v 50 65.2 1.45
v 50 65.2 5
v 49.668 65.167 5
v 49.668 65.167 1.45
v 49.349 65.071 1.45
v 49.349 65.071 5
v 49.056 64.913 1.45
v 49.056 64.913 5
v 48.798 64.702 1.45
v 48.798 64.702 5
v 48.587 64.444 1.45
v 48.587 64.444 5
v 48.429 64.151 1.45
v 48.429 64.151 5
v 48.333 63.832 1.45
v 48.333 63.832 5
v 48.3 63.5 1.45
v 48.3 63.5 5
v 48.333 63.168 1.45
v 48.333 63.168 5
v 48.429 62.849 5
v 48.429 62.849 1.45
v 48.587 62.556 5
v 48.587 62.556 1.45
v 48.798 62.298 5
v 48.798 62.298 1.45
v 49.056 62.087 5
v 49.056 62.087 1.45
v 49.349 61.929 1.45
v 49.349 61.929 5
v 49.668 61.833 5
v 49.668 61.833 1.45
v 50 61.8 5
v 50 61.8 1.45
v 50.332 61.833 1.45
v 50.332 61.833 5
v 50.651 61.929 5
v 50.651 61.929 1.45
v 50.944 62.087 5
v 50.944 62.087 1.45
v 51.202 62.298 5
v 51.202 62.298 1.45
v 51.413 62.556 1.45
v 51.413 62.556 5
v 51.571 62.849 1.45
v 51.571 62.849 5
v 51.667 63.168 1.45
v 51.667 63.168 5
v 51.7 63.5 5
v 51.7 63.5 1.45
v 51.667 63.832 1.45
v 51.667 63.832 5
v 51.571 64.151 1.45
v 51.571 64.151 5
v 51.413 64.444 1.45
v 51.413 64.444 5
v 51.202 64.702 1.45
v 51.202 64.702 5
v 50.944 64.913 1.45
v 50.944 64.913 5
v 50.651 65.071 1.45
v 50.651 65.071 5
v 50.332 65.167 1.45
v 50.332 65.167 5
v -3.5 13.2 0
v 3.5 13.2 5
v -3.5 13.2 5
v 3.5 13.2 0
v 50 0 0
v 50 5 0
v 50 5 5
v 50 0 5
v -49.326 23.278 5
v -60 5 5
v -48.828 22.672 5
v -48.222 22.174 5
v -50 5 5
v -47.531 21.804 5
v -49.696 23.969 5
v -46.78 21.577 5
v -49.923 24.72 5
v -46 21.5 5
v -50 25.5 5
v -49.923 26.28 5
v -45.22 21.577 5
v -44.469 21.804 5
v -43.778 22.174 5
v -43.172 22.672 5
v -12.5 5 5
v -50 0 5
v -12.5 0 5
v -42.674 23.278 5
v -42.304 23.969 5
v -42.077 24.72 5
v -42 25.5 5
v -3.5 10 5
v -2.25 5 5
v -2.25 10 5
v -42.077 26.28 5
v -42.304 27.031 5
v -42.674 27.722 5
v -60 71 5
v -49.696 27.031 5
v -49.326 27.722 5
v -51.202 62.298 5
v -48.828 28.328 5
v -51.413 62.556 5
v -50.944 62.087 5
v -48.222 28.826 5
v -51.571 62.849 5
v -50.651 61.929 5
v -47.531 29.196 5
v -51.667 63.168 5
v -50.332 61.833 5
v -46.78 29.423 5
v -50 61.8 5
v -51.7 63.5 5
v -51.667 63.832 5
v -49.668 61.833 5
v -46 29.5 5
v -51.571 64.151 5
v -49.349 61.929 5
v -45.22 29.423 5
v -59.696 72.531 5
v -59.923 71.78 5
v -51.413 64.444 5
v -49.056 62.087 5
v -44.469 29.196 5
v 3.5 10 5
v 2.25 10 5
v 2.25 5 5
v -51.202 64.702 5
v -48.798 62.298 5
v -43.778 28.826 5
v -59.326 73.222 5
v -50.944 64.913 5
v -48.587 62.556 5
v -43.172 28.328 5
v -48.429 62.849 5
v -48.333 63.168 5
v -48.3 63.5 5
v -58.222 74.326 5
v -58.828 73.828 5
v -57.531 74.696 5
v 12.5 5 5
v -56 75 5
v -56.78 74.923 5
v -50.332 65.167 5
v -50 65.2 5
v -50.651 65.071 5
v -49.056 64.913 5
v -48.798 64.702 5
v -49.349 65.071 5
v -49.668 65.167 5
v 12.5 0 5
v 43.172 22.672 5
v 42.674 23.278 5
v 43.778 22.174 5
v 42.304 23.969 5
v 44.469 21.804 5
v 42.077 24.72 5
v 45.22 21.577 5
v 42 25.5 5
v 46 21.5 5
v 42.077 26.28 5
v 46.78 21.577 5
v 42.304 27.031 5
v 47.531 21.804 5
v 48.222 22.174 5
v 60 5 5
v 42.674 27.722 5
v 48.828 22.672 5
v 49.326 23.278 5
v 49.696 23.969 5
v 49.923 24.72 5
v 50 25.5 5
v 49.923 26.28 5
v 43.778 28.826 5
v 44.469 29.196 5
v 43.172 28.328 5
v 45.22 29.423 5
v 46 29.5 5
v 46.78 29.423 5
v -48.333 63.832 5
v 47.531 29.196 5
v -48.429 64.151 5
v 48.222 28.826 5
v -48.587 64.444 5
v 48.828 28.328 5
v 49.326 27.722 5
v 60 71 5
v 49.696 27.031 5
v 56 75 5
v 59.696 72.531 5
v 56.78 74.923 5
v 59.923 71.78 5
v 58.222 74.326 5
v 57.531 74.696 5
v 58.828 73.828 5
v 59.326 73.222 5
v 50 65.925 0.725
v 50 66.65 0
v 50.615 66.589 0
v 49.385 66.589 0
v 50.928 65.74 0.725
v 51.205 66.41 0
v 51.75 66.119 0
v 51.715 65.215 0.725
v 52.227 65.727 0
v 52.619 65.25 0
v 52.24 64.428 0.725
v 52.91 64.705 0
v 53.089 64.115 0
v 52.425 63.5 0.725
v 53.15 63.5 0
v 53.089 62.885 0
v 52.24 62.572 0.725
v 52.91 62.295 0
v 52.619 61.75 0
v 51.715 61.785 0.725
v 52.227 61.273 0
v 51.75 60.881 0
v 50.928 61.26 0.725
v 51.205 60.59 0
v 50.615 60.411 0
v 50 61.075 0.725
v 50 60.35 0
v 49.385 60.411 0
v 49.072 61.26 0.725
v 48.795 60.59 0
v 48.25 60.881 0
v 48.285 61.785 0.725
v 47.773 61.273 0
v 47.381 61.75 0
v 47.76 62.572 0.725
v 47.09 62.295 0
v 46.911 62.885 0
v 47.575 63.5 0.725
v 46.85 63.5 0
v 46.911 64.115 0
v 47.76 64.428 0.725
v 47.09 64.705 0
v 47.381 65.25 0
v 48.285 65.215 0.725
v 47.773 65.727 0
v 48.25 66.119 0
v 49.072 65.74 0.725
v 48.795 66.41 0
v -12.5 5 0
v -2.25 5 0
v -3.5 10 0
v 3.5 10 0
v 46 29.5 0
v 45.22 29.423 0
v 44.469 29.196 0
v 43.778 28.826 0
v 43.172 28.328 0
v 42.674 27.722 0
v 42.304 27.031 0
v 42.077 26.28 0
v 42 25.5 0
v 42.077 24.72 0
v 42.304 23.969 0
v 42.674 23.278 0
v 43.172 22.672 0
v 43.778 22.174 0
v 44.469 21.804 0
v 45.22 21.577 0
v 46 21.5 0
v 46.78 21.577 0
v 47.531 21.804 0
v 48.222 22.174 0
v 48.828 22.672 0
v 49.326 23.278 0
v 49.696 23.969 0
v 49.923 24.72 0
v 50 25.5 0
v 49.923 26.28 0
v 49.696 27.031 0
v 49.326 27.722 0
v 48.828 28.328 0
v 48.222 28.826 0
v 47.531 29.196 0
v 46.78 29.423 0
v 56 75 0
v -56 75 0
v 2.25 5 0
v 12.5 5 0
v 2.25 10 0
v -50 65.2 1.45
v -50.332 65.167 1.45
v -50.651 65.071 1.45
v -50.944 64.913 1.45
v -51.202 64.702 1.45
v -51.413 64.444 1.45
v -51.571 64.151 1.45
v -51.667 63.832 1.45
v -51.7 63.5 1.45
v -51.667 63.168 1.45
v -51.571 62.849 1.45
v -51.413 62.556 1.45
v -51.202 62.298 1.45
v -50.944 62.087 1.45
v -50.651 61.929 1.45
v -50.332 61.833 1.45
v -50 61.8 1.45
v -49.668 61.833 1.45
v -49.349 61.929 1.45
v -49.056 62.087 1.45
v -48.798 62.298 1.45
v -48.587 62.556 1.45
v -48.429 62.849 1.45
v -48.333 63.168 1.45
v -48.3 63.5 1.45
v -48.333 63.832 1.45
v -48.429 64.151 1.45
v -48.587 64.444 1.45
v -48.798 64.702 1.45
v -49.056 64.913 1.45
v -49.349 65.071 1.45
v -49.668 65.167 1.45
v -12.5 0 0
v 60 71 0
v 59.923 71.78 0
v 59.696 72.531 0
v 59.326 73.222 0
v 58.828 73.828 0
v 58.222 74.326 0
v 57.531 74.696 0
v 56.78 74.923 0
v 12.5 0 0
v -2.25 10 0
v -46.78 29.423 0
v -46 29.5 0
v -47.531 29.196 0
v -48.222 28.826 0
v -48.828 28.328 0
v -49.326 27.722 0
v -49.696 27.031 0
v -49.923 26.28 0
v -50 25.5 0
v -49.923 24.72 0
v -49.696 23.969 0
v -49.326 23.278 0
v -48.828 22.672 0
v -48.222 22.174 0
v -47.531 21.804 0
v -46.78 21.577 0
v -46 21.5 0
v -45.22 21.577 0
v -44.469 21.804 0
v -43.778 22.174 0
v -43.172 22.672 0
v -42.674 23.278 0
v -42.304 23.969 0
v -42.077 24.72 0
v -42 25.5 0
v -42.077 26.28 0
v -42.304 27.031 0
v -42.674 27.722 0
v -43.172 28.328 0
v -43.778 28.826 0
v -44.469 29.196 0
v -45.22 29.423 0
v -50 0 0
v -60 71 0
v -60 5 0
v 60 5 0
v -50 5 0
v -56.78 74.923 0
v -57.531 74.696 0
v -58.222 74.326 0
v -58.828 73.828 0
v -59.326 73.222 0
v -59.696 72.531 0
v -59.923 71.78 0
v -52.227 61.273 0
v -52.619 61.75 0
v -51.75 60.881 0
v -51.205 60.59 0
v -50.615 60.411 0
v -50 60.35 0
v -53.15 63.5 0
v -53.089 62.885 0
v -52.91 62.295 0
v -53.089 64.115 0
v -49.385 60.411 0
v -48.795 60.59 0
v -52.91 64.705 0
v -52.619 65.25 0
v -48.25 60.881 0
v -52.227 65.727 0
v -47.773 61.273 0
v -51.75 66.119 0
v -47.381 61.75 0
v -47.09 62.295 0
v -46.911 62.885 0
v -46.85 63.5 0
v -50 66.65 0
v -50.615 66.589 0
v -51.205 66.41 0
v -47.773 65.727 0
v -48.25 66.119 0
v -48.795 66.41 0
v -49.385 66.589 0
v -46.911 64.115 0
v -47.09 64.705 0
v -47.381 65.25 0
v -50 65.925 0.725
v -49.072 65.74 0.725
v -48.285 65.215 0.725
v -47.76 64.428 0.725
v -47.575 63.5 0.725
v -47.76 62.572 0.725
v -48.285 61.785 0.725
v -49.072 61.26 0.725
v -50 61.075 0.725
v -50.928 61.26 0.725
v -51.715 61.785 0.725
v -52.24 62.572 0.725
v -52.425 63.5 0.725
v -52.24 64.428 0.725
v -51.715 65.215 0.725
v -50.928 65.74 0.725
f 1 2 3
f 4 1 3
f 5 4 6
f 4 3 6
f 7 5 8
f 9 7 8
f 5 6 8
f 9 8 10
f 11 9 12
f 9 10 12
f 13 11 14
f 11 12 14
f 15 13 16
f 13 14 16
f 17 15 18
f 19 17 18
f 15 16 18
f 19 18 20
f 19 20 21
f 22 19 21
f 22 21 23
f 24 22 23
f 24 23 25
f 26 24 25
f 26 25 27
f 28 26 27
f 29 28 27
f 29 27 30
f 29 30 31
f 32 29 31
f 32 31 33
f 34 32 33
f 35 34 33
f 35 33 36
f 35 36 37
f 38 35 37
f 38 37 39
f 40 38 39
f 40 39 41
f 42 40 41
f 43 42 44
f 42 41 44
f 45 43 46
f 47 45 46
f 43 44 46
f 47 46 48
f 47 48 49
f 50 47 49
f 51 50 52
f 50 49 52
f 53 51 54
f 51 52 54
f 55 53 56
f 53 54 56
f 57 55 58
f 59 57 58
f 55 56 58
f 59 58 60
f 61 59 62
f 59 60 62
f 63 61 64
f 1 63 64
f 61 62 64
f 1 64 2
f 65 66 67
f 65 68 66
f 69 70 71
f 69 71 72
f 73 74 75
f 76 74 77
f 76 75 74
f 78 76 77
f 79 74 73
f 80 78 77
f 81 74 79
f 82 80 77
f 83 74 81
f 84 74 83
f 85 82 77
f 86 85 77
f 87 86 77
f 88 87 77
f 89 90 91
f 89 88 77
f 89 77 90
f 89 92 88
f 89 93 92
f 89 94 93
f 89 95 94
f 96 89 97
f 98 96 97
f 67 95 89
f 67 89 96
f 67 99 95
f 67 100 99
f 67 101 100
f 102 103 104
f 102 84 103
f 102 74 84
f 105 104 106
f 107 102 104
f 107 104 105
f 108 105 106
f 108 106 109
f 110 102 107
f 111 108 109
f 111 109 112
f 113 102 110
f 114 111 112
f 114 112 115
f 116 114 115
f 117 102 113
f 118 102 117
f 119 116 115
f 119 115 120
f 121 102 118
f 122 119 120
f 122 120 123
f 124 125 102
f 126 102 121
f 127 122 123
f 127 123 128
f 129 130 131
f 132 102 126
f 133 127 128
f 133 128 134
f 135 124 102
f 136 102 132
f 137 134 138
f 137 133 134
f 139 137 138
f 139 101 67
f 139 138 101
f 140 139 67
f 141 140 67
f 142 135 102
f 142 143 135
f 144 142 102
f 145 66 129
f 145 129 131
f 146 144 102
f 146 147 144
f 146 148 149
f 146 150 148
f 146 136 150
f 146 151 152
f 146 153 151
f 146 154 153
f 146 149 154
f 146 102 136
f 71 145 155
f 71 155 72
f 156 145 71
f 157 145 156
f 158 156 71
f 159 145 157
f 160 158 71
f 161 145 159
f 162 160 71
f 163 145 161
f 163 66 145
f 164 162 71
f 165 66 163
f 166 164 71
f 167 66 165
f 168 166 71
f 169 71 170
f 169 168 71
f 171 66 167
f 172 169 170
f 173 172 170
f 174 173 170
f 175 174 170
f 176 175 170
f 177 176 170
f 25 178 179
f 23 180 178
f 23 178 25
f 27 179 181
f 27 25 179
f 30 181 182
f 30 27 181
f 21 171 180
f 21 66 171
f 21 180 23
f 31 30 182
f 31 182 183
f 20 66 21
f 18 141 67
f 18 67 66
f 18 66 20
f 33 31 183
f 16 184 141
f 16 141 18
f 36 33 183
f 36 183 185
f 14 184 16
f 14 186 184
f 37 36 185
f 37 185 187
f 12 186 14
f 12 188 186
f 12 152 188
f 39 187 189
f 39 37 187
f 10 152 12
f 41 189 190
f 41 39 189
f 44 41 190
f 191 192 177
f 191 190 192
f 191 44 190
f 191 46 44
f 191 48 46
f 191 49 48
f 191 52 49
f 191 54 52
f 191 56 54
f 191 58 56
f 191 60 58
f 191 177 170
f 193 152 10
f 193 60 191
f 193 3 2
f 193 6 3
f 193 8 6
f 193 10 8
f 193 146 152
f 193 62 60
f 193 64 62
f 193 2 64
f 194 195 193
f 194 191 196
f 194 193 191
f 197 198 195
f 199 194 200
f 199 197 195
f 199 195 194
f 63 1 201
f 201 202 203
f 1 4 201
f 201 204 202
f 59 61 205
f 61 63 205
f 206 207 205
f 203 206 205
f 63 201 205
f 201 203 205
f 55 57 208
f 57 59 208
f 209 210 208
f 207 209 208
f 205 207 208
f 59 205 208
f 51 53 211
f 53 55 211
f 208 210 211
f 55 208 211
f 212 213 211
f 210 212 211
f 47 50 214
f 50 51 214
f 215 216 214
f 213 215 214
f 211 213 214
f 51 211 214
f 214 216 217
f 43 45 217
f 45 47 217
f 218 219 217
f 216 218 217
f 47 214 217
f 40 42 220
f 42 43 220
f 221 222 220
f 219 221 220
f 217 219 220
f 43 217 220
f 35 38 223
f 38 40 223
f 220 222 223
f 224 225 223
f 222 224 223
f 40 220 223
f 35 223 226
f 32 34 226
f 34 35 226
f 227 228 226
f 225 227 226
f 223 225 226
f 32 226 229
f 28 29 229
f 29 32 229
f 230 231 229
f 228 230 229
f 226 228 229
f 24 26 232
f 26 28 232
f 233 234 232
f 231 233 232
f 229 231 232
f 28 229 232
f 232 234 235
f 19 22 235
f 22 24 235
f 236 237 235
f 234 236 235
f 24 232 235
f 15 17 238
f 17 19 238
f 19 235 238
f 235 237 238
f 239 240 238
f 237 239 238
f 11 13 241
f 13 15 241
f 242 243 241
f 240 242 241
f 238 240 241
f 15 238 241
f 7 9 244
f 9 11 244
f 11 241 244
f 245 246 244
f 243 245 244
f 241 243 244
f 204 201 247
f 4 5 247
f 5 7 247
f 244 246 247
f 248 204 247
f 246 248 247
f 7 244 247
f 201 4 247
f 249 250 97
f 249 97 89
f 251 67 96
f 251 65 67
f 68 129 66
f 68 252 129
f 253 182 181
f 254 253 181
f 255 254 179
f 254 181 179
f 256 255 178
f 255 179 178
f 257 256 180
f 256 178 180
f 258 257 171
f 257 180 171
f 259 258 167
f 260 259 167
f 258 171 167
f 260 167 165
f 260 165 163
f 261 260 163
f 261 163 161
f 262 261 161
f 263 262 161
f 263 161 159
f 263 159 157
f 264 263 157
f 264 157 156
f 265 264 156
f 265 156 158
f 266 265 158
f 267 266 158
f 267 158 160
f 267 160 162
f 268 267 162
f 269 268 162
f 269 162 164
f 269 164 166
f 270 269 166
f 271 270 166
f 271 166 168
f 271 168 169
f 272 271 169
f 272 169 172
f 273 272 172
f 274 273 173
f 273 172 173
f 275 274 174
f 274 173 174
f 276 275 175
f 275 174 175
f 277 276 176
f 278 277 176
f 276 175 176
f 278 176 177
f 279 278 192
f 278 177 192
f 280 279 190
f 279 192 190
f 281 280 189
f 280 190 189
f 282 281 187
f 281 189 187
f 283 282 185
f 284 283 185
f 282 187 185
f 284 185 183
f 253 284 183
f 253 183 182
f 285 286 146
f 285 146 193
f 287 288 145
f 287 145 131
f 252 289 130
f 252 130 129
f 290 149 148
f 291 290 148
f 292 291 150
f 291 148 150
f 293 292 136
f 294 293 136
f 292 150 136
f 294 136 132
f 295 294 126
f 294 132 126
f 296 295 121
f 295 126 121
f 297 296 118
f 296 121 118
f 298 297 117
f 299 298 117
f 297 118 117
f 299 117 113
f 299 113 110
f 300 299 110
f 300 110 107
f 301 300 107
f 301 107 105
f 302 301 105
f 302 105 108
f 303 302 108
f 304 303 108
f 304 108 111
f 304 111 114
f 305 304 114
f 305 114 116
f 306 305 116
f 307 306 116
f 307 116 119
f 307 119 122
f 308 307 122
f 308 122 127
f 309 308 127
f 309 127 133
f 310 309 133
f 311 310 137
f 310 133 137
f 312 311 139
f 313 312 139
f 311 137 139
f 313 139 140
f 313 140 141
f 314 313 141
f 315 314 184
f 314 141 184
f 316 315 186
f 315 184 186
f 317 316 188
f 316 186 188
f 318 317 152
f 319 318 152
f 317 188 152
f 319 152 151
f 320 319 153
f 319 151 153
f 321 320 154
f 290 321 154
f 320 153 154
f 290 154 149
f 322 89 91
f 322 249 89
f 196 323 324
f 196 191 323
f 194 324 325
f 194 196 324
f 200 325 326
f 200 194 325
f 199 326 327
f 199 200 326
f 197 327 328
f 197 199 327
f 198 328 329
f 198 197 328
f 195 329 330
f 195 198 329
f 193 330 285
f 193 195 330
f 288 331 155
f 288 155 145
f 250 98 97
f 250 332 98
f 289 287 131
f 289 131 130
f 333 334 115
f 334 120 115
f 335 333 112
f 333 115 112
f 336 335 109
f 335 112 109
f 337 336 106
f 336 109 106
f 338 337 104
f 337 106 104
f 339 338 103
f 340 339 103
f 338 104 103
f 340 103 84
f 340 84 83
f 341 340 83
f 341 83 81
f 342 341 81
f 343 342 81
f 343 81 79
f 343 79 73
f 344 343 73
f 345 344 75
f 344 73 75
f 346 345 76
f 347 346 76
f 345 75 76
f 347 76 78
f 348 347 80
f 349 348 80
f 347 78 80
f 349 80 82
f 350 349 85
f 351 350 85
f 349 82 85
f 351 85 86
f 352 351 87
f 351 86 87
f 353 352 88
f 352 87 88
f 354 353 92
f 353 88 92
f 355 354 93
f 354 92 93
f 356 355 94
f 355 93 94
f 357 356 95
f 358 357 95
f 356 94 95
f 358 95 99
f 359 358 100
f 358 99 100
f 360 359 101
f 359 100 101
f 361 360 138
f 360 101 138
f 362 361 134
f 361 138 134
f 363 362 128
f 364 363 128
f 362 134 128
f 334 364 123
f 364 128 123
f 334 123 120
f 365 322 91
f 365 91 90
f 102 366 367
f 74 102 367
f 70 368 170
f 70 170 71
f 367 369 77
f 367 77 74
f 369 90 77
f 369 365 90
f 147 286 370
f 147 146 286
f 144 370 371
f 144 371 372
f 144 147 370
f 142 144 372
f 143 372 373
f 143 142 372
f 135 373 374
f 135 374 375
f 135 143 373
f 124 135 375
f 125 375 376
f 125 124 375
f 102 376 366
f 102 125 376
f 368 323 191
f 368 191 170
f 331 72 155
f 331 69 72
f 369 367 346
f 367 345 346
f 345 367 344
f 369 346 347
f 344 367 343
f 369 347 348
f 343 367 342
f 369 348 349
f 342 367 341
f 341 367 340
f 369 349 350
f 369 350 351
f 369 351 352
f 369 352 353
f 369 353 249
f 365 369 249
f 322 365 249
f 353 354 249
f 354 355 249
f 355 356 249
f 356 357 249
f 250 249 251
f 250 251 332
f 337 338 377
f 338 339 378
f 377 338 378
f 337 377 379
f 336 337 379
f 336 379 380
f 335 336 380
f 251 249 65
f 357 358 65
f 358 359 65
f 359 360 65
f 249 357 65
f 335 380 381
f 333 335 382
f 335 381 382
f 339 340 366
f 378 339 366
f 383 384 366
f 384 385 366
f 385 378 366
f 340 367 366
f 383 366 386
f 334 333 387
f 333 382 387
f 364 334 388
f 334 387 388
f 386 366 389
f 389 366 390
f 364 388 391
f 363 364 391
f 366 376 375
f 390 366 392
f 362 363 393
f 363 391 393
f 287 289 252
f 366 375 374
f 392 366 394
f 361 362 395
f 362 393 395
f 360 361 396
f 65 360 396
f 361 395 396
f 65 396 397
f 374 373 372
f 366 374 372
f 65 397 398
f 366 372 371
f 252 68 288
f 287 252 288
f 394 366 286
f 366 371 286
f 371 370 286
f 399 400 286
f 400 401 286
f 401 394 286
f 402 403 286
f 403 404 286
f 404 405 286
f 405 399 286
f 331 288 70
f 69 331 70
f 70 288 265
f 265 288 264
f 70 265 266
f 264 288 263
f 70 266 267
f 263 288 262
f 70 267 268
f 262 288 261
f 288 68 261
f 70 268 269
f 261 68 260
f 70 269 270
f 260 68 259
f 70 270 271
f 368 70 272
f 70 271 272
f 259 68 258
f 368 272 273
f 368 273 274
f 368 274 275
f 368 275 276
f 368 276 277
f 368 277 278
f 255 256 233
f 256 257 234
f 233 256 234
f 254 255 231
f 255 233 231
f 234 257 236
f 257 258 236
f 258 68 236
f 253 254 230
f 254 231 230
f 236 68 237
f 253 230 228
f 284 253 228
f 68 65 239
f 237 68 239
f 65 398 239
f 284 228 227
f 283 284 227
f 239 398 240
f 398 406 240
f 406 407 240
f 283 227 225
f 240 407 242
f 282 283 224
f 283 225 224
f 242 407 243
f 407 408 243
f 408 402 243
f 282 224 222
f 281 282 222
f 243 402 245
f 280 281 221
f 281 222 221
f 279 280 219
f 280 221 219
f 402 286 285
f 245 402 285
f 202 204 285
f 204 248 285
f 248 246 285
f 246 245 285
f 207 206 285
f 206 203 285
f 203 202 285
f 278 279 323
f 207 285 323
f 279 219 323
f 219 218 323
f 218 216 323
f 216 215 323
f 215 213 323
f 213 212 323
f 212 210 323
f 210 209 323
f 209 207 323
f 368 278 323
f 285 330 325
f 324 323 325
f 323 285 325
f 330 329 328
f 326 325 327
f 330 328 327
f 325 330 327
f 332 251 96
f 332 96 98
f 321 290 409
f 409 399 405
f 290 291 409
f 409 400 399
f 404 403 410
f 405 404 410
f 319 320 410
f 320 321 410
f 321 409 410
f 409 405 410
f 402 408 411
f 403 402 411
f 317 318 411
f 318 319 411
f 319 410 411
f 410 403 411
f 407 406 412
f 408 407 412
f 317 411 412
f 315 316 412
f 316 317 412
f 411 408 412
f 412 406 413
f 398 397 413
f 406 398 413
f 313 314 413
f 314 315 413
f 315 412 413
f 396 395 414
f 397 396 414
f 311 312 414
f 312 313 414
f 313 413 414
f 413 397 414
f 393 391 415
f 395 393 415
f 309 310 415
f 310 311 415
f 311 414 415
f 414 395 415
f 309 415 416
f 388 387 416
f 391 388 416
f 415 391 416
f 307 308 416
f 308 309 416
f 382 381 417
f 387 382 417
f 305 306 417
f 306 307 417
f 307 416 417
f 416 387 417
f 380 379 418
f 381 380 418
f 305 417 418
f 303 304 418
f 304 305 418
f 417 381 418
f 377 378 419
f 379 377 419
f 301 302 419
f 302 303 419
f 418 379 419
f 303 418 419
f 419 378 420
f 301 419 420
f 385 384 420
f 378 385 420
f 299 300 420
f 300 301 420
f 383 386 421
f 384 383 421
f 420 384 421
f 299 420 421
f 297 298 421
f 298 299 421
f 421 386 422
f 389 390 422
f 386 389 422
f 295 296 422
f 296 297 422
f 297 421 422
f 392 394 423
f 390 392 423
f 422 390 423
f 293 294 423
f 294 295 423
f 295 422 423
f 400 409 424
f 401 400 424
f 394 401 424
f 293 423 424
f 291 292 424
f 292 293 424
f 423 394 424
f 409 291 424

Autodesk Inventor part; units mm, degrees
ref_plane "YZ Plane" through (0, 0, 0) normal (1, 0, 0) x (0, 1, 0)
ref_plane "XZ Plane" through (0, 0, 0) normal (0, 1, 0) x (-1, 0, 0)
ref_plane "XY Plane" through (0, 0, 0) normal (0, 0, 1) x (1, 0, 0)
sketch "Sketch1" plane through (0, 0, 0) normal (0, 0, 1) x (1, 0, 0)
  line L0 (-60, 75) -> (60, 75)
  line L1 (60, 75) -> (60, 5)
  line L2 (60, 5) -> (50, 5)
  line L3 (50, 5) -> (50, 0)
  line L4 (-50, 0) -> (-50, 5)
  line L5 (-50, 5) -> (-60, 5)
  line L6 (-60, 75) -> (-60, 5)
  line L7 (50, 0) -> (12.5, 0)
  line L8 (12.5, 0) -> (12.5, 5)
  line L9 (12.5, 5) -> (-12.5, 5)
  line L10 (-12.5, 5) -> (-12.5, 0)
  line L11 (-12.5, 0) -> (-50, 0)
  point P0 (0, 0)
  point P1 (0, 75)
  point P2 (0, 0)
  point P3 (0, 5)
  dimension "d0" = 5
  dimension "d1" = 100
  dimension "d2" = 120
  dimension "d3" = 70
  dimension "d22" = 5
  dimension "d23" = 25
  dimension "d24" = 5
  dimension "d25" = 10
extrude "Extrusion1" add sketch "Sketch1" along normal blind 5
sketch "Sketch3" plane through (0, 0, 0) normal (0, 0, -1) x (-1, 0, 0)
  line L0 (-50, 63.5) -> (50, 63.5) construction
  line L1 (12.5, 5) -> (-12.5, 5) projected
  point P0 (0, 0)
  point P1 (0, 63.5)
  dimension "d12" = 100
  dimension "d43" = 58.5
hole "Hole1" at (50, 63.5, 0) at (-50, 63.5, 0) direction (0, 0, 1) diameter 3.4 depth 8 tip angle 118 countersink diameter 6.3 countersink angle 90 clearance for "Countersunk Flat Head Screw DIN EN ISO 2009" size "M3" standard "DIN"
fillet "Fillet1" radius 4 2 edges at (60, 75, 2.5) (-60, 75, 2.5)
sketch "Sketch5" plane through (0, 0, 0) normal (0, 0, -1) x (-1, 0, 0)
  line L0 (-2.25, 5) -> (-2.25, 10)
  line L1 (-2.25, 10) -> (-3.5, 10)
  line L2 (-3.5, 10) -> (-3.5, 13.2)
  line L3 (-3.5, 13.2) -> (3.5, 13.2)
  line L4 (3.5, 13.2) -> (3.5, 10)
  line L5 (3.5, 10) -> (2.25, 10)
  line L6 (2.25, 10) -> (2.25, 5)
  line L7 (-12.5, 5) -> (12.5, 5) projected
  line L8 (-2.25, 5) -> (2.25, 5)
  point P0 (0, 0)
  point P1 (0, 13.2)
  point P2 (0, 5)
  point P3 (0, 5)
  dimension "d26" = 7
  dimension "d27" = 3.2
  dimension "d28" = 5
  dimension "d29" = 4.5
extrude "Extrusion3" cut sketch "Sketch5" against normal blind 5
sketch "Sketch6" plane through (0, 0, 0) normal (0, 0, -1) x (-1, 0, 0)
  line L0 (-60, 71) -> (-60, 5) projected
  line L1 (56, 75) -> (-56, 75) projected
  circle A0 centre (-50, 63.5) radius 1.7 projected
  point P0 (0, 0)
  point P1 (-46, 25.5)
  point P2 (46, 25.5)
  dimension "d41" = 4
  dimension "d42" = 38
  dimension "d44" = 92
hole "Hole2" at (46, 25.5, 0) at (-46, 25.5, 0) direction (0, 0, 1) diameter 8 depth 8 tip angle 118
equation "\"d25\" = -0.5 * d1 + 0.5 * d2"
properties part number "LogicHolder" material "Polycarbonate, Clear"
